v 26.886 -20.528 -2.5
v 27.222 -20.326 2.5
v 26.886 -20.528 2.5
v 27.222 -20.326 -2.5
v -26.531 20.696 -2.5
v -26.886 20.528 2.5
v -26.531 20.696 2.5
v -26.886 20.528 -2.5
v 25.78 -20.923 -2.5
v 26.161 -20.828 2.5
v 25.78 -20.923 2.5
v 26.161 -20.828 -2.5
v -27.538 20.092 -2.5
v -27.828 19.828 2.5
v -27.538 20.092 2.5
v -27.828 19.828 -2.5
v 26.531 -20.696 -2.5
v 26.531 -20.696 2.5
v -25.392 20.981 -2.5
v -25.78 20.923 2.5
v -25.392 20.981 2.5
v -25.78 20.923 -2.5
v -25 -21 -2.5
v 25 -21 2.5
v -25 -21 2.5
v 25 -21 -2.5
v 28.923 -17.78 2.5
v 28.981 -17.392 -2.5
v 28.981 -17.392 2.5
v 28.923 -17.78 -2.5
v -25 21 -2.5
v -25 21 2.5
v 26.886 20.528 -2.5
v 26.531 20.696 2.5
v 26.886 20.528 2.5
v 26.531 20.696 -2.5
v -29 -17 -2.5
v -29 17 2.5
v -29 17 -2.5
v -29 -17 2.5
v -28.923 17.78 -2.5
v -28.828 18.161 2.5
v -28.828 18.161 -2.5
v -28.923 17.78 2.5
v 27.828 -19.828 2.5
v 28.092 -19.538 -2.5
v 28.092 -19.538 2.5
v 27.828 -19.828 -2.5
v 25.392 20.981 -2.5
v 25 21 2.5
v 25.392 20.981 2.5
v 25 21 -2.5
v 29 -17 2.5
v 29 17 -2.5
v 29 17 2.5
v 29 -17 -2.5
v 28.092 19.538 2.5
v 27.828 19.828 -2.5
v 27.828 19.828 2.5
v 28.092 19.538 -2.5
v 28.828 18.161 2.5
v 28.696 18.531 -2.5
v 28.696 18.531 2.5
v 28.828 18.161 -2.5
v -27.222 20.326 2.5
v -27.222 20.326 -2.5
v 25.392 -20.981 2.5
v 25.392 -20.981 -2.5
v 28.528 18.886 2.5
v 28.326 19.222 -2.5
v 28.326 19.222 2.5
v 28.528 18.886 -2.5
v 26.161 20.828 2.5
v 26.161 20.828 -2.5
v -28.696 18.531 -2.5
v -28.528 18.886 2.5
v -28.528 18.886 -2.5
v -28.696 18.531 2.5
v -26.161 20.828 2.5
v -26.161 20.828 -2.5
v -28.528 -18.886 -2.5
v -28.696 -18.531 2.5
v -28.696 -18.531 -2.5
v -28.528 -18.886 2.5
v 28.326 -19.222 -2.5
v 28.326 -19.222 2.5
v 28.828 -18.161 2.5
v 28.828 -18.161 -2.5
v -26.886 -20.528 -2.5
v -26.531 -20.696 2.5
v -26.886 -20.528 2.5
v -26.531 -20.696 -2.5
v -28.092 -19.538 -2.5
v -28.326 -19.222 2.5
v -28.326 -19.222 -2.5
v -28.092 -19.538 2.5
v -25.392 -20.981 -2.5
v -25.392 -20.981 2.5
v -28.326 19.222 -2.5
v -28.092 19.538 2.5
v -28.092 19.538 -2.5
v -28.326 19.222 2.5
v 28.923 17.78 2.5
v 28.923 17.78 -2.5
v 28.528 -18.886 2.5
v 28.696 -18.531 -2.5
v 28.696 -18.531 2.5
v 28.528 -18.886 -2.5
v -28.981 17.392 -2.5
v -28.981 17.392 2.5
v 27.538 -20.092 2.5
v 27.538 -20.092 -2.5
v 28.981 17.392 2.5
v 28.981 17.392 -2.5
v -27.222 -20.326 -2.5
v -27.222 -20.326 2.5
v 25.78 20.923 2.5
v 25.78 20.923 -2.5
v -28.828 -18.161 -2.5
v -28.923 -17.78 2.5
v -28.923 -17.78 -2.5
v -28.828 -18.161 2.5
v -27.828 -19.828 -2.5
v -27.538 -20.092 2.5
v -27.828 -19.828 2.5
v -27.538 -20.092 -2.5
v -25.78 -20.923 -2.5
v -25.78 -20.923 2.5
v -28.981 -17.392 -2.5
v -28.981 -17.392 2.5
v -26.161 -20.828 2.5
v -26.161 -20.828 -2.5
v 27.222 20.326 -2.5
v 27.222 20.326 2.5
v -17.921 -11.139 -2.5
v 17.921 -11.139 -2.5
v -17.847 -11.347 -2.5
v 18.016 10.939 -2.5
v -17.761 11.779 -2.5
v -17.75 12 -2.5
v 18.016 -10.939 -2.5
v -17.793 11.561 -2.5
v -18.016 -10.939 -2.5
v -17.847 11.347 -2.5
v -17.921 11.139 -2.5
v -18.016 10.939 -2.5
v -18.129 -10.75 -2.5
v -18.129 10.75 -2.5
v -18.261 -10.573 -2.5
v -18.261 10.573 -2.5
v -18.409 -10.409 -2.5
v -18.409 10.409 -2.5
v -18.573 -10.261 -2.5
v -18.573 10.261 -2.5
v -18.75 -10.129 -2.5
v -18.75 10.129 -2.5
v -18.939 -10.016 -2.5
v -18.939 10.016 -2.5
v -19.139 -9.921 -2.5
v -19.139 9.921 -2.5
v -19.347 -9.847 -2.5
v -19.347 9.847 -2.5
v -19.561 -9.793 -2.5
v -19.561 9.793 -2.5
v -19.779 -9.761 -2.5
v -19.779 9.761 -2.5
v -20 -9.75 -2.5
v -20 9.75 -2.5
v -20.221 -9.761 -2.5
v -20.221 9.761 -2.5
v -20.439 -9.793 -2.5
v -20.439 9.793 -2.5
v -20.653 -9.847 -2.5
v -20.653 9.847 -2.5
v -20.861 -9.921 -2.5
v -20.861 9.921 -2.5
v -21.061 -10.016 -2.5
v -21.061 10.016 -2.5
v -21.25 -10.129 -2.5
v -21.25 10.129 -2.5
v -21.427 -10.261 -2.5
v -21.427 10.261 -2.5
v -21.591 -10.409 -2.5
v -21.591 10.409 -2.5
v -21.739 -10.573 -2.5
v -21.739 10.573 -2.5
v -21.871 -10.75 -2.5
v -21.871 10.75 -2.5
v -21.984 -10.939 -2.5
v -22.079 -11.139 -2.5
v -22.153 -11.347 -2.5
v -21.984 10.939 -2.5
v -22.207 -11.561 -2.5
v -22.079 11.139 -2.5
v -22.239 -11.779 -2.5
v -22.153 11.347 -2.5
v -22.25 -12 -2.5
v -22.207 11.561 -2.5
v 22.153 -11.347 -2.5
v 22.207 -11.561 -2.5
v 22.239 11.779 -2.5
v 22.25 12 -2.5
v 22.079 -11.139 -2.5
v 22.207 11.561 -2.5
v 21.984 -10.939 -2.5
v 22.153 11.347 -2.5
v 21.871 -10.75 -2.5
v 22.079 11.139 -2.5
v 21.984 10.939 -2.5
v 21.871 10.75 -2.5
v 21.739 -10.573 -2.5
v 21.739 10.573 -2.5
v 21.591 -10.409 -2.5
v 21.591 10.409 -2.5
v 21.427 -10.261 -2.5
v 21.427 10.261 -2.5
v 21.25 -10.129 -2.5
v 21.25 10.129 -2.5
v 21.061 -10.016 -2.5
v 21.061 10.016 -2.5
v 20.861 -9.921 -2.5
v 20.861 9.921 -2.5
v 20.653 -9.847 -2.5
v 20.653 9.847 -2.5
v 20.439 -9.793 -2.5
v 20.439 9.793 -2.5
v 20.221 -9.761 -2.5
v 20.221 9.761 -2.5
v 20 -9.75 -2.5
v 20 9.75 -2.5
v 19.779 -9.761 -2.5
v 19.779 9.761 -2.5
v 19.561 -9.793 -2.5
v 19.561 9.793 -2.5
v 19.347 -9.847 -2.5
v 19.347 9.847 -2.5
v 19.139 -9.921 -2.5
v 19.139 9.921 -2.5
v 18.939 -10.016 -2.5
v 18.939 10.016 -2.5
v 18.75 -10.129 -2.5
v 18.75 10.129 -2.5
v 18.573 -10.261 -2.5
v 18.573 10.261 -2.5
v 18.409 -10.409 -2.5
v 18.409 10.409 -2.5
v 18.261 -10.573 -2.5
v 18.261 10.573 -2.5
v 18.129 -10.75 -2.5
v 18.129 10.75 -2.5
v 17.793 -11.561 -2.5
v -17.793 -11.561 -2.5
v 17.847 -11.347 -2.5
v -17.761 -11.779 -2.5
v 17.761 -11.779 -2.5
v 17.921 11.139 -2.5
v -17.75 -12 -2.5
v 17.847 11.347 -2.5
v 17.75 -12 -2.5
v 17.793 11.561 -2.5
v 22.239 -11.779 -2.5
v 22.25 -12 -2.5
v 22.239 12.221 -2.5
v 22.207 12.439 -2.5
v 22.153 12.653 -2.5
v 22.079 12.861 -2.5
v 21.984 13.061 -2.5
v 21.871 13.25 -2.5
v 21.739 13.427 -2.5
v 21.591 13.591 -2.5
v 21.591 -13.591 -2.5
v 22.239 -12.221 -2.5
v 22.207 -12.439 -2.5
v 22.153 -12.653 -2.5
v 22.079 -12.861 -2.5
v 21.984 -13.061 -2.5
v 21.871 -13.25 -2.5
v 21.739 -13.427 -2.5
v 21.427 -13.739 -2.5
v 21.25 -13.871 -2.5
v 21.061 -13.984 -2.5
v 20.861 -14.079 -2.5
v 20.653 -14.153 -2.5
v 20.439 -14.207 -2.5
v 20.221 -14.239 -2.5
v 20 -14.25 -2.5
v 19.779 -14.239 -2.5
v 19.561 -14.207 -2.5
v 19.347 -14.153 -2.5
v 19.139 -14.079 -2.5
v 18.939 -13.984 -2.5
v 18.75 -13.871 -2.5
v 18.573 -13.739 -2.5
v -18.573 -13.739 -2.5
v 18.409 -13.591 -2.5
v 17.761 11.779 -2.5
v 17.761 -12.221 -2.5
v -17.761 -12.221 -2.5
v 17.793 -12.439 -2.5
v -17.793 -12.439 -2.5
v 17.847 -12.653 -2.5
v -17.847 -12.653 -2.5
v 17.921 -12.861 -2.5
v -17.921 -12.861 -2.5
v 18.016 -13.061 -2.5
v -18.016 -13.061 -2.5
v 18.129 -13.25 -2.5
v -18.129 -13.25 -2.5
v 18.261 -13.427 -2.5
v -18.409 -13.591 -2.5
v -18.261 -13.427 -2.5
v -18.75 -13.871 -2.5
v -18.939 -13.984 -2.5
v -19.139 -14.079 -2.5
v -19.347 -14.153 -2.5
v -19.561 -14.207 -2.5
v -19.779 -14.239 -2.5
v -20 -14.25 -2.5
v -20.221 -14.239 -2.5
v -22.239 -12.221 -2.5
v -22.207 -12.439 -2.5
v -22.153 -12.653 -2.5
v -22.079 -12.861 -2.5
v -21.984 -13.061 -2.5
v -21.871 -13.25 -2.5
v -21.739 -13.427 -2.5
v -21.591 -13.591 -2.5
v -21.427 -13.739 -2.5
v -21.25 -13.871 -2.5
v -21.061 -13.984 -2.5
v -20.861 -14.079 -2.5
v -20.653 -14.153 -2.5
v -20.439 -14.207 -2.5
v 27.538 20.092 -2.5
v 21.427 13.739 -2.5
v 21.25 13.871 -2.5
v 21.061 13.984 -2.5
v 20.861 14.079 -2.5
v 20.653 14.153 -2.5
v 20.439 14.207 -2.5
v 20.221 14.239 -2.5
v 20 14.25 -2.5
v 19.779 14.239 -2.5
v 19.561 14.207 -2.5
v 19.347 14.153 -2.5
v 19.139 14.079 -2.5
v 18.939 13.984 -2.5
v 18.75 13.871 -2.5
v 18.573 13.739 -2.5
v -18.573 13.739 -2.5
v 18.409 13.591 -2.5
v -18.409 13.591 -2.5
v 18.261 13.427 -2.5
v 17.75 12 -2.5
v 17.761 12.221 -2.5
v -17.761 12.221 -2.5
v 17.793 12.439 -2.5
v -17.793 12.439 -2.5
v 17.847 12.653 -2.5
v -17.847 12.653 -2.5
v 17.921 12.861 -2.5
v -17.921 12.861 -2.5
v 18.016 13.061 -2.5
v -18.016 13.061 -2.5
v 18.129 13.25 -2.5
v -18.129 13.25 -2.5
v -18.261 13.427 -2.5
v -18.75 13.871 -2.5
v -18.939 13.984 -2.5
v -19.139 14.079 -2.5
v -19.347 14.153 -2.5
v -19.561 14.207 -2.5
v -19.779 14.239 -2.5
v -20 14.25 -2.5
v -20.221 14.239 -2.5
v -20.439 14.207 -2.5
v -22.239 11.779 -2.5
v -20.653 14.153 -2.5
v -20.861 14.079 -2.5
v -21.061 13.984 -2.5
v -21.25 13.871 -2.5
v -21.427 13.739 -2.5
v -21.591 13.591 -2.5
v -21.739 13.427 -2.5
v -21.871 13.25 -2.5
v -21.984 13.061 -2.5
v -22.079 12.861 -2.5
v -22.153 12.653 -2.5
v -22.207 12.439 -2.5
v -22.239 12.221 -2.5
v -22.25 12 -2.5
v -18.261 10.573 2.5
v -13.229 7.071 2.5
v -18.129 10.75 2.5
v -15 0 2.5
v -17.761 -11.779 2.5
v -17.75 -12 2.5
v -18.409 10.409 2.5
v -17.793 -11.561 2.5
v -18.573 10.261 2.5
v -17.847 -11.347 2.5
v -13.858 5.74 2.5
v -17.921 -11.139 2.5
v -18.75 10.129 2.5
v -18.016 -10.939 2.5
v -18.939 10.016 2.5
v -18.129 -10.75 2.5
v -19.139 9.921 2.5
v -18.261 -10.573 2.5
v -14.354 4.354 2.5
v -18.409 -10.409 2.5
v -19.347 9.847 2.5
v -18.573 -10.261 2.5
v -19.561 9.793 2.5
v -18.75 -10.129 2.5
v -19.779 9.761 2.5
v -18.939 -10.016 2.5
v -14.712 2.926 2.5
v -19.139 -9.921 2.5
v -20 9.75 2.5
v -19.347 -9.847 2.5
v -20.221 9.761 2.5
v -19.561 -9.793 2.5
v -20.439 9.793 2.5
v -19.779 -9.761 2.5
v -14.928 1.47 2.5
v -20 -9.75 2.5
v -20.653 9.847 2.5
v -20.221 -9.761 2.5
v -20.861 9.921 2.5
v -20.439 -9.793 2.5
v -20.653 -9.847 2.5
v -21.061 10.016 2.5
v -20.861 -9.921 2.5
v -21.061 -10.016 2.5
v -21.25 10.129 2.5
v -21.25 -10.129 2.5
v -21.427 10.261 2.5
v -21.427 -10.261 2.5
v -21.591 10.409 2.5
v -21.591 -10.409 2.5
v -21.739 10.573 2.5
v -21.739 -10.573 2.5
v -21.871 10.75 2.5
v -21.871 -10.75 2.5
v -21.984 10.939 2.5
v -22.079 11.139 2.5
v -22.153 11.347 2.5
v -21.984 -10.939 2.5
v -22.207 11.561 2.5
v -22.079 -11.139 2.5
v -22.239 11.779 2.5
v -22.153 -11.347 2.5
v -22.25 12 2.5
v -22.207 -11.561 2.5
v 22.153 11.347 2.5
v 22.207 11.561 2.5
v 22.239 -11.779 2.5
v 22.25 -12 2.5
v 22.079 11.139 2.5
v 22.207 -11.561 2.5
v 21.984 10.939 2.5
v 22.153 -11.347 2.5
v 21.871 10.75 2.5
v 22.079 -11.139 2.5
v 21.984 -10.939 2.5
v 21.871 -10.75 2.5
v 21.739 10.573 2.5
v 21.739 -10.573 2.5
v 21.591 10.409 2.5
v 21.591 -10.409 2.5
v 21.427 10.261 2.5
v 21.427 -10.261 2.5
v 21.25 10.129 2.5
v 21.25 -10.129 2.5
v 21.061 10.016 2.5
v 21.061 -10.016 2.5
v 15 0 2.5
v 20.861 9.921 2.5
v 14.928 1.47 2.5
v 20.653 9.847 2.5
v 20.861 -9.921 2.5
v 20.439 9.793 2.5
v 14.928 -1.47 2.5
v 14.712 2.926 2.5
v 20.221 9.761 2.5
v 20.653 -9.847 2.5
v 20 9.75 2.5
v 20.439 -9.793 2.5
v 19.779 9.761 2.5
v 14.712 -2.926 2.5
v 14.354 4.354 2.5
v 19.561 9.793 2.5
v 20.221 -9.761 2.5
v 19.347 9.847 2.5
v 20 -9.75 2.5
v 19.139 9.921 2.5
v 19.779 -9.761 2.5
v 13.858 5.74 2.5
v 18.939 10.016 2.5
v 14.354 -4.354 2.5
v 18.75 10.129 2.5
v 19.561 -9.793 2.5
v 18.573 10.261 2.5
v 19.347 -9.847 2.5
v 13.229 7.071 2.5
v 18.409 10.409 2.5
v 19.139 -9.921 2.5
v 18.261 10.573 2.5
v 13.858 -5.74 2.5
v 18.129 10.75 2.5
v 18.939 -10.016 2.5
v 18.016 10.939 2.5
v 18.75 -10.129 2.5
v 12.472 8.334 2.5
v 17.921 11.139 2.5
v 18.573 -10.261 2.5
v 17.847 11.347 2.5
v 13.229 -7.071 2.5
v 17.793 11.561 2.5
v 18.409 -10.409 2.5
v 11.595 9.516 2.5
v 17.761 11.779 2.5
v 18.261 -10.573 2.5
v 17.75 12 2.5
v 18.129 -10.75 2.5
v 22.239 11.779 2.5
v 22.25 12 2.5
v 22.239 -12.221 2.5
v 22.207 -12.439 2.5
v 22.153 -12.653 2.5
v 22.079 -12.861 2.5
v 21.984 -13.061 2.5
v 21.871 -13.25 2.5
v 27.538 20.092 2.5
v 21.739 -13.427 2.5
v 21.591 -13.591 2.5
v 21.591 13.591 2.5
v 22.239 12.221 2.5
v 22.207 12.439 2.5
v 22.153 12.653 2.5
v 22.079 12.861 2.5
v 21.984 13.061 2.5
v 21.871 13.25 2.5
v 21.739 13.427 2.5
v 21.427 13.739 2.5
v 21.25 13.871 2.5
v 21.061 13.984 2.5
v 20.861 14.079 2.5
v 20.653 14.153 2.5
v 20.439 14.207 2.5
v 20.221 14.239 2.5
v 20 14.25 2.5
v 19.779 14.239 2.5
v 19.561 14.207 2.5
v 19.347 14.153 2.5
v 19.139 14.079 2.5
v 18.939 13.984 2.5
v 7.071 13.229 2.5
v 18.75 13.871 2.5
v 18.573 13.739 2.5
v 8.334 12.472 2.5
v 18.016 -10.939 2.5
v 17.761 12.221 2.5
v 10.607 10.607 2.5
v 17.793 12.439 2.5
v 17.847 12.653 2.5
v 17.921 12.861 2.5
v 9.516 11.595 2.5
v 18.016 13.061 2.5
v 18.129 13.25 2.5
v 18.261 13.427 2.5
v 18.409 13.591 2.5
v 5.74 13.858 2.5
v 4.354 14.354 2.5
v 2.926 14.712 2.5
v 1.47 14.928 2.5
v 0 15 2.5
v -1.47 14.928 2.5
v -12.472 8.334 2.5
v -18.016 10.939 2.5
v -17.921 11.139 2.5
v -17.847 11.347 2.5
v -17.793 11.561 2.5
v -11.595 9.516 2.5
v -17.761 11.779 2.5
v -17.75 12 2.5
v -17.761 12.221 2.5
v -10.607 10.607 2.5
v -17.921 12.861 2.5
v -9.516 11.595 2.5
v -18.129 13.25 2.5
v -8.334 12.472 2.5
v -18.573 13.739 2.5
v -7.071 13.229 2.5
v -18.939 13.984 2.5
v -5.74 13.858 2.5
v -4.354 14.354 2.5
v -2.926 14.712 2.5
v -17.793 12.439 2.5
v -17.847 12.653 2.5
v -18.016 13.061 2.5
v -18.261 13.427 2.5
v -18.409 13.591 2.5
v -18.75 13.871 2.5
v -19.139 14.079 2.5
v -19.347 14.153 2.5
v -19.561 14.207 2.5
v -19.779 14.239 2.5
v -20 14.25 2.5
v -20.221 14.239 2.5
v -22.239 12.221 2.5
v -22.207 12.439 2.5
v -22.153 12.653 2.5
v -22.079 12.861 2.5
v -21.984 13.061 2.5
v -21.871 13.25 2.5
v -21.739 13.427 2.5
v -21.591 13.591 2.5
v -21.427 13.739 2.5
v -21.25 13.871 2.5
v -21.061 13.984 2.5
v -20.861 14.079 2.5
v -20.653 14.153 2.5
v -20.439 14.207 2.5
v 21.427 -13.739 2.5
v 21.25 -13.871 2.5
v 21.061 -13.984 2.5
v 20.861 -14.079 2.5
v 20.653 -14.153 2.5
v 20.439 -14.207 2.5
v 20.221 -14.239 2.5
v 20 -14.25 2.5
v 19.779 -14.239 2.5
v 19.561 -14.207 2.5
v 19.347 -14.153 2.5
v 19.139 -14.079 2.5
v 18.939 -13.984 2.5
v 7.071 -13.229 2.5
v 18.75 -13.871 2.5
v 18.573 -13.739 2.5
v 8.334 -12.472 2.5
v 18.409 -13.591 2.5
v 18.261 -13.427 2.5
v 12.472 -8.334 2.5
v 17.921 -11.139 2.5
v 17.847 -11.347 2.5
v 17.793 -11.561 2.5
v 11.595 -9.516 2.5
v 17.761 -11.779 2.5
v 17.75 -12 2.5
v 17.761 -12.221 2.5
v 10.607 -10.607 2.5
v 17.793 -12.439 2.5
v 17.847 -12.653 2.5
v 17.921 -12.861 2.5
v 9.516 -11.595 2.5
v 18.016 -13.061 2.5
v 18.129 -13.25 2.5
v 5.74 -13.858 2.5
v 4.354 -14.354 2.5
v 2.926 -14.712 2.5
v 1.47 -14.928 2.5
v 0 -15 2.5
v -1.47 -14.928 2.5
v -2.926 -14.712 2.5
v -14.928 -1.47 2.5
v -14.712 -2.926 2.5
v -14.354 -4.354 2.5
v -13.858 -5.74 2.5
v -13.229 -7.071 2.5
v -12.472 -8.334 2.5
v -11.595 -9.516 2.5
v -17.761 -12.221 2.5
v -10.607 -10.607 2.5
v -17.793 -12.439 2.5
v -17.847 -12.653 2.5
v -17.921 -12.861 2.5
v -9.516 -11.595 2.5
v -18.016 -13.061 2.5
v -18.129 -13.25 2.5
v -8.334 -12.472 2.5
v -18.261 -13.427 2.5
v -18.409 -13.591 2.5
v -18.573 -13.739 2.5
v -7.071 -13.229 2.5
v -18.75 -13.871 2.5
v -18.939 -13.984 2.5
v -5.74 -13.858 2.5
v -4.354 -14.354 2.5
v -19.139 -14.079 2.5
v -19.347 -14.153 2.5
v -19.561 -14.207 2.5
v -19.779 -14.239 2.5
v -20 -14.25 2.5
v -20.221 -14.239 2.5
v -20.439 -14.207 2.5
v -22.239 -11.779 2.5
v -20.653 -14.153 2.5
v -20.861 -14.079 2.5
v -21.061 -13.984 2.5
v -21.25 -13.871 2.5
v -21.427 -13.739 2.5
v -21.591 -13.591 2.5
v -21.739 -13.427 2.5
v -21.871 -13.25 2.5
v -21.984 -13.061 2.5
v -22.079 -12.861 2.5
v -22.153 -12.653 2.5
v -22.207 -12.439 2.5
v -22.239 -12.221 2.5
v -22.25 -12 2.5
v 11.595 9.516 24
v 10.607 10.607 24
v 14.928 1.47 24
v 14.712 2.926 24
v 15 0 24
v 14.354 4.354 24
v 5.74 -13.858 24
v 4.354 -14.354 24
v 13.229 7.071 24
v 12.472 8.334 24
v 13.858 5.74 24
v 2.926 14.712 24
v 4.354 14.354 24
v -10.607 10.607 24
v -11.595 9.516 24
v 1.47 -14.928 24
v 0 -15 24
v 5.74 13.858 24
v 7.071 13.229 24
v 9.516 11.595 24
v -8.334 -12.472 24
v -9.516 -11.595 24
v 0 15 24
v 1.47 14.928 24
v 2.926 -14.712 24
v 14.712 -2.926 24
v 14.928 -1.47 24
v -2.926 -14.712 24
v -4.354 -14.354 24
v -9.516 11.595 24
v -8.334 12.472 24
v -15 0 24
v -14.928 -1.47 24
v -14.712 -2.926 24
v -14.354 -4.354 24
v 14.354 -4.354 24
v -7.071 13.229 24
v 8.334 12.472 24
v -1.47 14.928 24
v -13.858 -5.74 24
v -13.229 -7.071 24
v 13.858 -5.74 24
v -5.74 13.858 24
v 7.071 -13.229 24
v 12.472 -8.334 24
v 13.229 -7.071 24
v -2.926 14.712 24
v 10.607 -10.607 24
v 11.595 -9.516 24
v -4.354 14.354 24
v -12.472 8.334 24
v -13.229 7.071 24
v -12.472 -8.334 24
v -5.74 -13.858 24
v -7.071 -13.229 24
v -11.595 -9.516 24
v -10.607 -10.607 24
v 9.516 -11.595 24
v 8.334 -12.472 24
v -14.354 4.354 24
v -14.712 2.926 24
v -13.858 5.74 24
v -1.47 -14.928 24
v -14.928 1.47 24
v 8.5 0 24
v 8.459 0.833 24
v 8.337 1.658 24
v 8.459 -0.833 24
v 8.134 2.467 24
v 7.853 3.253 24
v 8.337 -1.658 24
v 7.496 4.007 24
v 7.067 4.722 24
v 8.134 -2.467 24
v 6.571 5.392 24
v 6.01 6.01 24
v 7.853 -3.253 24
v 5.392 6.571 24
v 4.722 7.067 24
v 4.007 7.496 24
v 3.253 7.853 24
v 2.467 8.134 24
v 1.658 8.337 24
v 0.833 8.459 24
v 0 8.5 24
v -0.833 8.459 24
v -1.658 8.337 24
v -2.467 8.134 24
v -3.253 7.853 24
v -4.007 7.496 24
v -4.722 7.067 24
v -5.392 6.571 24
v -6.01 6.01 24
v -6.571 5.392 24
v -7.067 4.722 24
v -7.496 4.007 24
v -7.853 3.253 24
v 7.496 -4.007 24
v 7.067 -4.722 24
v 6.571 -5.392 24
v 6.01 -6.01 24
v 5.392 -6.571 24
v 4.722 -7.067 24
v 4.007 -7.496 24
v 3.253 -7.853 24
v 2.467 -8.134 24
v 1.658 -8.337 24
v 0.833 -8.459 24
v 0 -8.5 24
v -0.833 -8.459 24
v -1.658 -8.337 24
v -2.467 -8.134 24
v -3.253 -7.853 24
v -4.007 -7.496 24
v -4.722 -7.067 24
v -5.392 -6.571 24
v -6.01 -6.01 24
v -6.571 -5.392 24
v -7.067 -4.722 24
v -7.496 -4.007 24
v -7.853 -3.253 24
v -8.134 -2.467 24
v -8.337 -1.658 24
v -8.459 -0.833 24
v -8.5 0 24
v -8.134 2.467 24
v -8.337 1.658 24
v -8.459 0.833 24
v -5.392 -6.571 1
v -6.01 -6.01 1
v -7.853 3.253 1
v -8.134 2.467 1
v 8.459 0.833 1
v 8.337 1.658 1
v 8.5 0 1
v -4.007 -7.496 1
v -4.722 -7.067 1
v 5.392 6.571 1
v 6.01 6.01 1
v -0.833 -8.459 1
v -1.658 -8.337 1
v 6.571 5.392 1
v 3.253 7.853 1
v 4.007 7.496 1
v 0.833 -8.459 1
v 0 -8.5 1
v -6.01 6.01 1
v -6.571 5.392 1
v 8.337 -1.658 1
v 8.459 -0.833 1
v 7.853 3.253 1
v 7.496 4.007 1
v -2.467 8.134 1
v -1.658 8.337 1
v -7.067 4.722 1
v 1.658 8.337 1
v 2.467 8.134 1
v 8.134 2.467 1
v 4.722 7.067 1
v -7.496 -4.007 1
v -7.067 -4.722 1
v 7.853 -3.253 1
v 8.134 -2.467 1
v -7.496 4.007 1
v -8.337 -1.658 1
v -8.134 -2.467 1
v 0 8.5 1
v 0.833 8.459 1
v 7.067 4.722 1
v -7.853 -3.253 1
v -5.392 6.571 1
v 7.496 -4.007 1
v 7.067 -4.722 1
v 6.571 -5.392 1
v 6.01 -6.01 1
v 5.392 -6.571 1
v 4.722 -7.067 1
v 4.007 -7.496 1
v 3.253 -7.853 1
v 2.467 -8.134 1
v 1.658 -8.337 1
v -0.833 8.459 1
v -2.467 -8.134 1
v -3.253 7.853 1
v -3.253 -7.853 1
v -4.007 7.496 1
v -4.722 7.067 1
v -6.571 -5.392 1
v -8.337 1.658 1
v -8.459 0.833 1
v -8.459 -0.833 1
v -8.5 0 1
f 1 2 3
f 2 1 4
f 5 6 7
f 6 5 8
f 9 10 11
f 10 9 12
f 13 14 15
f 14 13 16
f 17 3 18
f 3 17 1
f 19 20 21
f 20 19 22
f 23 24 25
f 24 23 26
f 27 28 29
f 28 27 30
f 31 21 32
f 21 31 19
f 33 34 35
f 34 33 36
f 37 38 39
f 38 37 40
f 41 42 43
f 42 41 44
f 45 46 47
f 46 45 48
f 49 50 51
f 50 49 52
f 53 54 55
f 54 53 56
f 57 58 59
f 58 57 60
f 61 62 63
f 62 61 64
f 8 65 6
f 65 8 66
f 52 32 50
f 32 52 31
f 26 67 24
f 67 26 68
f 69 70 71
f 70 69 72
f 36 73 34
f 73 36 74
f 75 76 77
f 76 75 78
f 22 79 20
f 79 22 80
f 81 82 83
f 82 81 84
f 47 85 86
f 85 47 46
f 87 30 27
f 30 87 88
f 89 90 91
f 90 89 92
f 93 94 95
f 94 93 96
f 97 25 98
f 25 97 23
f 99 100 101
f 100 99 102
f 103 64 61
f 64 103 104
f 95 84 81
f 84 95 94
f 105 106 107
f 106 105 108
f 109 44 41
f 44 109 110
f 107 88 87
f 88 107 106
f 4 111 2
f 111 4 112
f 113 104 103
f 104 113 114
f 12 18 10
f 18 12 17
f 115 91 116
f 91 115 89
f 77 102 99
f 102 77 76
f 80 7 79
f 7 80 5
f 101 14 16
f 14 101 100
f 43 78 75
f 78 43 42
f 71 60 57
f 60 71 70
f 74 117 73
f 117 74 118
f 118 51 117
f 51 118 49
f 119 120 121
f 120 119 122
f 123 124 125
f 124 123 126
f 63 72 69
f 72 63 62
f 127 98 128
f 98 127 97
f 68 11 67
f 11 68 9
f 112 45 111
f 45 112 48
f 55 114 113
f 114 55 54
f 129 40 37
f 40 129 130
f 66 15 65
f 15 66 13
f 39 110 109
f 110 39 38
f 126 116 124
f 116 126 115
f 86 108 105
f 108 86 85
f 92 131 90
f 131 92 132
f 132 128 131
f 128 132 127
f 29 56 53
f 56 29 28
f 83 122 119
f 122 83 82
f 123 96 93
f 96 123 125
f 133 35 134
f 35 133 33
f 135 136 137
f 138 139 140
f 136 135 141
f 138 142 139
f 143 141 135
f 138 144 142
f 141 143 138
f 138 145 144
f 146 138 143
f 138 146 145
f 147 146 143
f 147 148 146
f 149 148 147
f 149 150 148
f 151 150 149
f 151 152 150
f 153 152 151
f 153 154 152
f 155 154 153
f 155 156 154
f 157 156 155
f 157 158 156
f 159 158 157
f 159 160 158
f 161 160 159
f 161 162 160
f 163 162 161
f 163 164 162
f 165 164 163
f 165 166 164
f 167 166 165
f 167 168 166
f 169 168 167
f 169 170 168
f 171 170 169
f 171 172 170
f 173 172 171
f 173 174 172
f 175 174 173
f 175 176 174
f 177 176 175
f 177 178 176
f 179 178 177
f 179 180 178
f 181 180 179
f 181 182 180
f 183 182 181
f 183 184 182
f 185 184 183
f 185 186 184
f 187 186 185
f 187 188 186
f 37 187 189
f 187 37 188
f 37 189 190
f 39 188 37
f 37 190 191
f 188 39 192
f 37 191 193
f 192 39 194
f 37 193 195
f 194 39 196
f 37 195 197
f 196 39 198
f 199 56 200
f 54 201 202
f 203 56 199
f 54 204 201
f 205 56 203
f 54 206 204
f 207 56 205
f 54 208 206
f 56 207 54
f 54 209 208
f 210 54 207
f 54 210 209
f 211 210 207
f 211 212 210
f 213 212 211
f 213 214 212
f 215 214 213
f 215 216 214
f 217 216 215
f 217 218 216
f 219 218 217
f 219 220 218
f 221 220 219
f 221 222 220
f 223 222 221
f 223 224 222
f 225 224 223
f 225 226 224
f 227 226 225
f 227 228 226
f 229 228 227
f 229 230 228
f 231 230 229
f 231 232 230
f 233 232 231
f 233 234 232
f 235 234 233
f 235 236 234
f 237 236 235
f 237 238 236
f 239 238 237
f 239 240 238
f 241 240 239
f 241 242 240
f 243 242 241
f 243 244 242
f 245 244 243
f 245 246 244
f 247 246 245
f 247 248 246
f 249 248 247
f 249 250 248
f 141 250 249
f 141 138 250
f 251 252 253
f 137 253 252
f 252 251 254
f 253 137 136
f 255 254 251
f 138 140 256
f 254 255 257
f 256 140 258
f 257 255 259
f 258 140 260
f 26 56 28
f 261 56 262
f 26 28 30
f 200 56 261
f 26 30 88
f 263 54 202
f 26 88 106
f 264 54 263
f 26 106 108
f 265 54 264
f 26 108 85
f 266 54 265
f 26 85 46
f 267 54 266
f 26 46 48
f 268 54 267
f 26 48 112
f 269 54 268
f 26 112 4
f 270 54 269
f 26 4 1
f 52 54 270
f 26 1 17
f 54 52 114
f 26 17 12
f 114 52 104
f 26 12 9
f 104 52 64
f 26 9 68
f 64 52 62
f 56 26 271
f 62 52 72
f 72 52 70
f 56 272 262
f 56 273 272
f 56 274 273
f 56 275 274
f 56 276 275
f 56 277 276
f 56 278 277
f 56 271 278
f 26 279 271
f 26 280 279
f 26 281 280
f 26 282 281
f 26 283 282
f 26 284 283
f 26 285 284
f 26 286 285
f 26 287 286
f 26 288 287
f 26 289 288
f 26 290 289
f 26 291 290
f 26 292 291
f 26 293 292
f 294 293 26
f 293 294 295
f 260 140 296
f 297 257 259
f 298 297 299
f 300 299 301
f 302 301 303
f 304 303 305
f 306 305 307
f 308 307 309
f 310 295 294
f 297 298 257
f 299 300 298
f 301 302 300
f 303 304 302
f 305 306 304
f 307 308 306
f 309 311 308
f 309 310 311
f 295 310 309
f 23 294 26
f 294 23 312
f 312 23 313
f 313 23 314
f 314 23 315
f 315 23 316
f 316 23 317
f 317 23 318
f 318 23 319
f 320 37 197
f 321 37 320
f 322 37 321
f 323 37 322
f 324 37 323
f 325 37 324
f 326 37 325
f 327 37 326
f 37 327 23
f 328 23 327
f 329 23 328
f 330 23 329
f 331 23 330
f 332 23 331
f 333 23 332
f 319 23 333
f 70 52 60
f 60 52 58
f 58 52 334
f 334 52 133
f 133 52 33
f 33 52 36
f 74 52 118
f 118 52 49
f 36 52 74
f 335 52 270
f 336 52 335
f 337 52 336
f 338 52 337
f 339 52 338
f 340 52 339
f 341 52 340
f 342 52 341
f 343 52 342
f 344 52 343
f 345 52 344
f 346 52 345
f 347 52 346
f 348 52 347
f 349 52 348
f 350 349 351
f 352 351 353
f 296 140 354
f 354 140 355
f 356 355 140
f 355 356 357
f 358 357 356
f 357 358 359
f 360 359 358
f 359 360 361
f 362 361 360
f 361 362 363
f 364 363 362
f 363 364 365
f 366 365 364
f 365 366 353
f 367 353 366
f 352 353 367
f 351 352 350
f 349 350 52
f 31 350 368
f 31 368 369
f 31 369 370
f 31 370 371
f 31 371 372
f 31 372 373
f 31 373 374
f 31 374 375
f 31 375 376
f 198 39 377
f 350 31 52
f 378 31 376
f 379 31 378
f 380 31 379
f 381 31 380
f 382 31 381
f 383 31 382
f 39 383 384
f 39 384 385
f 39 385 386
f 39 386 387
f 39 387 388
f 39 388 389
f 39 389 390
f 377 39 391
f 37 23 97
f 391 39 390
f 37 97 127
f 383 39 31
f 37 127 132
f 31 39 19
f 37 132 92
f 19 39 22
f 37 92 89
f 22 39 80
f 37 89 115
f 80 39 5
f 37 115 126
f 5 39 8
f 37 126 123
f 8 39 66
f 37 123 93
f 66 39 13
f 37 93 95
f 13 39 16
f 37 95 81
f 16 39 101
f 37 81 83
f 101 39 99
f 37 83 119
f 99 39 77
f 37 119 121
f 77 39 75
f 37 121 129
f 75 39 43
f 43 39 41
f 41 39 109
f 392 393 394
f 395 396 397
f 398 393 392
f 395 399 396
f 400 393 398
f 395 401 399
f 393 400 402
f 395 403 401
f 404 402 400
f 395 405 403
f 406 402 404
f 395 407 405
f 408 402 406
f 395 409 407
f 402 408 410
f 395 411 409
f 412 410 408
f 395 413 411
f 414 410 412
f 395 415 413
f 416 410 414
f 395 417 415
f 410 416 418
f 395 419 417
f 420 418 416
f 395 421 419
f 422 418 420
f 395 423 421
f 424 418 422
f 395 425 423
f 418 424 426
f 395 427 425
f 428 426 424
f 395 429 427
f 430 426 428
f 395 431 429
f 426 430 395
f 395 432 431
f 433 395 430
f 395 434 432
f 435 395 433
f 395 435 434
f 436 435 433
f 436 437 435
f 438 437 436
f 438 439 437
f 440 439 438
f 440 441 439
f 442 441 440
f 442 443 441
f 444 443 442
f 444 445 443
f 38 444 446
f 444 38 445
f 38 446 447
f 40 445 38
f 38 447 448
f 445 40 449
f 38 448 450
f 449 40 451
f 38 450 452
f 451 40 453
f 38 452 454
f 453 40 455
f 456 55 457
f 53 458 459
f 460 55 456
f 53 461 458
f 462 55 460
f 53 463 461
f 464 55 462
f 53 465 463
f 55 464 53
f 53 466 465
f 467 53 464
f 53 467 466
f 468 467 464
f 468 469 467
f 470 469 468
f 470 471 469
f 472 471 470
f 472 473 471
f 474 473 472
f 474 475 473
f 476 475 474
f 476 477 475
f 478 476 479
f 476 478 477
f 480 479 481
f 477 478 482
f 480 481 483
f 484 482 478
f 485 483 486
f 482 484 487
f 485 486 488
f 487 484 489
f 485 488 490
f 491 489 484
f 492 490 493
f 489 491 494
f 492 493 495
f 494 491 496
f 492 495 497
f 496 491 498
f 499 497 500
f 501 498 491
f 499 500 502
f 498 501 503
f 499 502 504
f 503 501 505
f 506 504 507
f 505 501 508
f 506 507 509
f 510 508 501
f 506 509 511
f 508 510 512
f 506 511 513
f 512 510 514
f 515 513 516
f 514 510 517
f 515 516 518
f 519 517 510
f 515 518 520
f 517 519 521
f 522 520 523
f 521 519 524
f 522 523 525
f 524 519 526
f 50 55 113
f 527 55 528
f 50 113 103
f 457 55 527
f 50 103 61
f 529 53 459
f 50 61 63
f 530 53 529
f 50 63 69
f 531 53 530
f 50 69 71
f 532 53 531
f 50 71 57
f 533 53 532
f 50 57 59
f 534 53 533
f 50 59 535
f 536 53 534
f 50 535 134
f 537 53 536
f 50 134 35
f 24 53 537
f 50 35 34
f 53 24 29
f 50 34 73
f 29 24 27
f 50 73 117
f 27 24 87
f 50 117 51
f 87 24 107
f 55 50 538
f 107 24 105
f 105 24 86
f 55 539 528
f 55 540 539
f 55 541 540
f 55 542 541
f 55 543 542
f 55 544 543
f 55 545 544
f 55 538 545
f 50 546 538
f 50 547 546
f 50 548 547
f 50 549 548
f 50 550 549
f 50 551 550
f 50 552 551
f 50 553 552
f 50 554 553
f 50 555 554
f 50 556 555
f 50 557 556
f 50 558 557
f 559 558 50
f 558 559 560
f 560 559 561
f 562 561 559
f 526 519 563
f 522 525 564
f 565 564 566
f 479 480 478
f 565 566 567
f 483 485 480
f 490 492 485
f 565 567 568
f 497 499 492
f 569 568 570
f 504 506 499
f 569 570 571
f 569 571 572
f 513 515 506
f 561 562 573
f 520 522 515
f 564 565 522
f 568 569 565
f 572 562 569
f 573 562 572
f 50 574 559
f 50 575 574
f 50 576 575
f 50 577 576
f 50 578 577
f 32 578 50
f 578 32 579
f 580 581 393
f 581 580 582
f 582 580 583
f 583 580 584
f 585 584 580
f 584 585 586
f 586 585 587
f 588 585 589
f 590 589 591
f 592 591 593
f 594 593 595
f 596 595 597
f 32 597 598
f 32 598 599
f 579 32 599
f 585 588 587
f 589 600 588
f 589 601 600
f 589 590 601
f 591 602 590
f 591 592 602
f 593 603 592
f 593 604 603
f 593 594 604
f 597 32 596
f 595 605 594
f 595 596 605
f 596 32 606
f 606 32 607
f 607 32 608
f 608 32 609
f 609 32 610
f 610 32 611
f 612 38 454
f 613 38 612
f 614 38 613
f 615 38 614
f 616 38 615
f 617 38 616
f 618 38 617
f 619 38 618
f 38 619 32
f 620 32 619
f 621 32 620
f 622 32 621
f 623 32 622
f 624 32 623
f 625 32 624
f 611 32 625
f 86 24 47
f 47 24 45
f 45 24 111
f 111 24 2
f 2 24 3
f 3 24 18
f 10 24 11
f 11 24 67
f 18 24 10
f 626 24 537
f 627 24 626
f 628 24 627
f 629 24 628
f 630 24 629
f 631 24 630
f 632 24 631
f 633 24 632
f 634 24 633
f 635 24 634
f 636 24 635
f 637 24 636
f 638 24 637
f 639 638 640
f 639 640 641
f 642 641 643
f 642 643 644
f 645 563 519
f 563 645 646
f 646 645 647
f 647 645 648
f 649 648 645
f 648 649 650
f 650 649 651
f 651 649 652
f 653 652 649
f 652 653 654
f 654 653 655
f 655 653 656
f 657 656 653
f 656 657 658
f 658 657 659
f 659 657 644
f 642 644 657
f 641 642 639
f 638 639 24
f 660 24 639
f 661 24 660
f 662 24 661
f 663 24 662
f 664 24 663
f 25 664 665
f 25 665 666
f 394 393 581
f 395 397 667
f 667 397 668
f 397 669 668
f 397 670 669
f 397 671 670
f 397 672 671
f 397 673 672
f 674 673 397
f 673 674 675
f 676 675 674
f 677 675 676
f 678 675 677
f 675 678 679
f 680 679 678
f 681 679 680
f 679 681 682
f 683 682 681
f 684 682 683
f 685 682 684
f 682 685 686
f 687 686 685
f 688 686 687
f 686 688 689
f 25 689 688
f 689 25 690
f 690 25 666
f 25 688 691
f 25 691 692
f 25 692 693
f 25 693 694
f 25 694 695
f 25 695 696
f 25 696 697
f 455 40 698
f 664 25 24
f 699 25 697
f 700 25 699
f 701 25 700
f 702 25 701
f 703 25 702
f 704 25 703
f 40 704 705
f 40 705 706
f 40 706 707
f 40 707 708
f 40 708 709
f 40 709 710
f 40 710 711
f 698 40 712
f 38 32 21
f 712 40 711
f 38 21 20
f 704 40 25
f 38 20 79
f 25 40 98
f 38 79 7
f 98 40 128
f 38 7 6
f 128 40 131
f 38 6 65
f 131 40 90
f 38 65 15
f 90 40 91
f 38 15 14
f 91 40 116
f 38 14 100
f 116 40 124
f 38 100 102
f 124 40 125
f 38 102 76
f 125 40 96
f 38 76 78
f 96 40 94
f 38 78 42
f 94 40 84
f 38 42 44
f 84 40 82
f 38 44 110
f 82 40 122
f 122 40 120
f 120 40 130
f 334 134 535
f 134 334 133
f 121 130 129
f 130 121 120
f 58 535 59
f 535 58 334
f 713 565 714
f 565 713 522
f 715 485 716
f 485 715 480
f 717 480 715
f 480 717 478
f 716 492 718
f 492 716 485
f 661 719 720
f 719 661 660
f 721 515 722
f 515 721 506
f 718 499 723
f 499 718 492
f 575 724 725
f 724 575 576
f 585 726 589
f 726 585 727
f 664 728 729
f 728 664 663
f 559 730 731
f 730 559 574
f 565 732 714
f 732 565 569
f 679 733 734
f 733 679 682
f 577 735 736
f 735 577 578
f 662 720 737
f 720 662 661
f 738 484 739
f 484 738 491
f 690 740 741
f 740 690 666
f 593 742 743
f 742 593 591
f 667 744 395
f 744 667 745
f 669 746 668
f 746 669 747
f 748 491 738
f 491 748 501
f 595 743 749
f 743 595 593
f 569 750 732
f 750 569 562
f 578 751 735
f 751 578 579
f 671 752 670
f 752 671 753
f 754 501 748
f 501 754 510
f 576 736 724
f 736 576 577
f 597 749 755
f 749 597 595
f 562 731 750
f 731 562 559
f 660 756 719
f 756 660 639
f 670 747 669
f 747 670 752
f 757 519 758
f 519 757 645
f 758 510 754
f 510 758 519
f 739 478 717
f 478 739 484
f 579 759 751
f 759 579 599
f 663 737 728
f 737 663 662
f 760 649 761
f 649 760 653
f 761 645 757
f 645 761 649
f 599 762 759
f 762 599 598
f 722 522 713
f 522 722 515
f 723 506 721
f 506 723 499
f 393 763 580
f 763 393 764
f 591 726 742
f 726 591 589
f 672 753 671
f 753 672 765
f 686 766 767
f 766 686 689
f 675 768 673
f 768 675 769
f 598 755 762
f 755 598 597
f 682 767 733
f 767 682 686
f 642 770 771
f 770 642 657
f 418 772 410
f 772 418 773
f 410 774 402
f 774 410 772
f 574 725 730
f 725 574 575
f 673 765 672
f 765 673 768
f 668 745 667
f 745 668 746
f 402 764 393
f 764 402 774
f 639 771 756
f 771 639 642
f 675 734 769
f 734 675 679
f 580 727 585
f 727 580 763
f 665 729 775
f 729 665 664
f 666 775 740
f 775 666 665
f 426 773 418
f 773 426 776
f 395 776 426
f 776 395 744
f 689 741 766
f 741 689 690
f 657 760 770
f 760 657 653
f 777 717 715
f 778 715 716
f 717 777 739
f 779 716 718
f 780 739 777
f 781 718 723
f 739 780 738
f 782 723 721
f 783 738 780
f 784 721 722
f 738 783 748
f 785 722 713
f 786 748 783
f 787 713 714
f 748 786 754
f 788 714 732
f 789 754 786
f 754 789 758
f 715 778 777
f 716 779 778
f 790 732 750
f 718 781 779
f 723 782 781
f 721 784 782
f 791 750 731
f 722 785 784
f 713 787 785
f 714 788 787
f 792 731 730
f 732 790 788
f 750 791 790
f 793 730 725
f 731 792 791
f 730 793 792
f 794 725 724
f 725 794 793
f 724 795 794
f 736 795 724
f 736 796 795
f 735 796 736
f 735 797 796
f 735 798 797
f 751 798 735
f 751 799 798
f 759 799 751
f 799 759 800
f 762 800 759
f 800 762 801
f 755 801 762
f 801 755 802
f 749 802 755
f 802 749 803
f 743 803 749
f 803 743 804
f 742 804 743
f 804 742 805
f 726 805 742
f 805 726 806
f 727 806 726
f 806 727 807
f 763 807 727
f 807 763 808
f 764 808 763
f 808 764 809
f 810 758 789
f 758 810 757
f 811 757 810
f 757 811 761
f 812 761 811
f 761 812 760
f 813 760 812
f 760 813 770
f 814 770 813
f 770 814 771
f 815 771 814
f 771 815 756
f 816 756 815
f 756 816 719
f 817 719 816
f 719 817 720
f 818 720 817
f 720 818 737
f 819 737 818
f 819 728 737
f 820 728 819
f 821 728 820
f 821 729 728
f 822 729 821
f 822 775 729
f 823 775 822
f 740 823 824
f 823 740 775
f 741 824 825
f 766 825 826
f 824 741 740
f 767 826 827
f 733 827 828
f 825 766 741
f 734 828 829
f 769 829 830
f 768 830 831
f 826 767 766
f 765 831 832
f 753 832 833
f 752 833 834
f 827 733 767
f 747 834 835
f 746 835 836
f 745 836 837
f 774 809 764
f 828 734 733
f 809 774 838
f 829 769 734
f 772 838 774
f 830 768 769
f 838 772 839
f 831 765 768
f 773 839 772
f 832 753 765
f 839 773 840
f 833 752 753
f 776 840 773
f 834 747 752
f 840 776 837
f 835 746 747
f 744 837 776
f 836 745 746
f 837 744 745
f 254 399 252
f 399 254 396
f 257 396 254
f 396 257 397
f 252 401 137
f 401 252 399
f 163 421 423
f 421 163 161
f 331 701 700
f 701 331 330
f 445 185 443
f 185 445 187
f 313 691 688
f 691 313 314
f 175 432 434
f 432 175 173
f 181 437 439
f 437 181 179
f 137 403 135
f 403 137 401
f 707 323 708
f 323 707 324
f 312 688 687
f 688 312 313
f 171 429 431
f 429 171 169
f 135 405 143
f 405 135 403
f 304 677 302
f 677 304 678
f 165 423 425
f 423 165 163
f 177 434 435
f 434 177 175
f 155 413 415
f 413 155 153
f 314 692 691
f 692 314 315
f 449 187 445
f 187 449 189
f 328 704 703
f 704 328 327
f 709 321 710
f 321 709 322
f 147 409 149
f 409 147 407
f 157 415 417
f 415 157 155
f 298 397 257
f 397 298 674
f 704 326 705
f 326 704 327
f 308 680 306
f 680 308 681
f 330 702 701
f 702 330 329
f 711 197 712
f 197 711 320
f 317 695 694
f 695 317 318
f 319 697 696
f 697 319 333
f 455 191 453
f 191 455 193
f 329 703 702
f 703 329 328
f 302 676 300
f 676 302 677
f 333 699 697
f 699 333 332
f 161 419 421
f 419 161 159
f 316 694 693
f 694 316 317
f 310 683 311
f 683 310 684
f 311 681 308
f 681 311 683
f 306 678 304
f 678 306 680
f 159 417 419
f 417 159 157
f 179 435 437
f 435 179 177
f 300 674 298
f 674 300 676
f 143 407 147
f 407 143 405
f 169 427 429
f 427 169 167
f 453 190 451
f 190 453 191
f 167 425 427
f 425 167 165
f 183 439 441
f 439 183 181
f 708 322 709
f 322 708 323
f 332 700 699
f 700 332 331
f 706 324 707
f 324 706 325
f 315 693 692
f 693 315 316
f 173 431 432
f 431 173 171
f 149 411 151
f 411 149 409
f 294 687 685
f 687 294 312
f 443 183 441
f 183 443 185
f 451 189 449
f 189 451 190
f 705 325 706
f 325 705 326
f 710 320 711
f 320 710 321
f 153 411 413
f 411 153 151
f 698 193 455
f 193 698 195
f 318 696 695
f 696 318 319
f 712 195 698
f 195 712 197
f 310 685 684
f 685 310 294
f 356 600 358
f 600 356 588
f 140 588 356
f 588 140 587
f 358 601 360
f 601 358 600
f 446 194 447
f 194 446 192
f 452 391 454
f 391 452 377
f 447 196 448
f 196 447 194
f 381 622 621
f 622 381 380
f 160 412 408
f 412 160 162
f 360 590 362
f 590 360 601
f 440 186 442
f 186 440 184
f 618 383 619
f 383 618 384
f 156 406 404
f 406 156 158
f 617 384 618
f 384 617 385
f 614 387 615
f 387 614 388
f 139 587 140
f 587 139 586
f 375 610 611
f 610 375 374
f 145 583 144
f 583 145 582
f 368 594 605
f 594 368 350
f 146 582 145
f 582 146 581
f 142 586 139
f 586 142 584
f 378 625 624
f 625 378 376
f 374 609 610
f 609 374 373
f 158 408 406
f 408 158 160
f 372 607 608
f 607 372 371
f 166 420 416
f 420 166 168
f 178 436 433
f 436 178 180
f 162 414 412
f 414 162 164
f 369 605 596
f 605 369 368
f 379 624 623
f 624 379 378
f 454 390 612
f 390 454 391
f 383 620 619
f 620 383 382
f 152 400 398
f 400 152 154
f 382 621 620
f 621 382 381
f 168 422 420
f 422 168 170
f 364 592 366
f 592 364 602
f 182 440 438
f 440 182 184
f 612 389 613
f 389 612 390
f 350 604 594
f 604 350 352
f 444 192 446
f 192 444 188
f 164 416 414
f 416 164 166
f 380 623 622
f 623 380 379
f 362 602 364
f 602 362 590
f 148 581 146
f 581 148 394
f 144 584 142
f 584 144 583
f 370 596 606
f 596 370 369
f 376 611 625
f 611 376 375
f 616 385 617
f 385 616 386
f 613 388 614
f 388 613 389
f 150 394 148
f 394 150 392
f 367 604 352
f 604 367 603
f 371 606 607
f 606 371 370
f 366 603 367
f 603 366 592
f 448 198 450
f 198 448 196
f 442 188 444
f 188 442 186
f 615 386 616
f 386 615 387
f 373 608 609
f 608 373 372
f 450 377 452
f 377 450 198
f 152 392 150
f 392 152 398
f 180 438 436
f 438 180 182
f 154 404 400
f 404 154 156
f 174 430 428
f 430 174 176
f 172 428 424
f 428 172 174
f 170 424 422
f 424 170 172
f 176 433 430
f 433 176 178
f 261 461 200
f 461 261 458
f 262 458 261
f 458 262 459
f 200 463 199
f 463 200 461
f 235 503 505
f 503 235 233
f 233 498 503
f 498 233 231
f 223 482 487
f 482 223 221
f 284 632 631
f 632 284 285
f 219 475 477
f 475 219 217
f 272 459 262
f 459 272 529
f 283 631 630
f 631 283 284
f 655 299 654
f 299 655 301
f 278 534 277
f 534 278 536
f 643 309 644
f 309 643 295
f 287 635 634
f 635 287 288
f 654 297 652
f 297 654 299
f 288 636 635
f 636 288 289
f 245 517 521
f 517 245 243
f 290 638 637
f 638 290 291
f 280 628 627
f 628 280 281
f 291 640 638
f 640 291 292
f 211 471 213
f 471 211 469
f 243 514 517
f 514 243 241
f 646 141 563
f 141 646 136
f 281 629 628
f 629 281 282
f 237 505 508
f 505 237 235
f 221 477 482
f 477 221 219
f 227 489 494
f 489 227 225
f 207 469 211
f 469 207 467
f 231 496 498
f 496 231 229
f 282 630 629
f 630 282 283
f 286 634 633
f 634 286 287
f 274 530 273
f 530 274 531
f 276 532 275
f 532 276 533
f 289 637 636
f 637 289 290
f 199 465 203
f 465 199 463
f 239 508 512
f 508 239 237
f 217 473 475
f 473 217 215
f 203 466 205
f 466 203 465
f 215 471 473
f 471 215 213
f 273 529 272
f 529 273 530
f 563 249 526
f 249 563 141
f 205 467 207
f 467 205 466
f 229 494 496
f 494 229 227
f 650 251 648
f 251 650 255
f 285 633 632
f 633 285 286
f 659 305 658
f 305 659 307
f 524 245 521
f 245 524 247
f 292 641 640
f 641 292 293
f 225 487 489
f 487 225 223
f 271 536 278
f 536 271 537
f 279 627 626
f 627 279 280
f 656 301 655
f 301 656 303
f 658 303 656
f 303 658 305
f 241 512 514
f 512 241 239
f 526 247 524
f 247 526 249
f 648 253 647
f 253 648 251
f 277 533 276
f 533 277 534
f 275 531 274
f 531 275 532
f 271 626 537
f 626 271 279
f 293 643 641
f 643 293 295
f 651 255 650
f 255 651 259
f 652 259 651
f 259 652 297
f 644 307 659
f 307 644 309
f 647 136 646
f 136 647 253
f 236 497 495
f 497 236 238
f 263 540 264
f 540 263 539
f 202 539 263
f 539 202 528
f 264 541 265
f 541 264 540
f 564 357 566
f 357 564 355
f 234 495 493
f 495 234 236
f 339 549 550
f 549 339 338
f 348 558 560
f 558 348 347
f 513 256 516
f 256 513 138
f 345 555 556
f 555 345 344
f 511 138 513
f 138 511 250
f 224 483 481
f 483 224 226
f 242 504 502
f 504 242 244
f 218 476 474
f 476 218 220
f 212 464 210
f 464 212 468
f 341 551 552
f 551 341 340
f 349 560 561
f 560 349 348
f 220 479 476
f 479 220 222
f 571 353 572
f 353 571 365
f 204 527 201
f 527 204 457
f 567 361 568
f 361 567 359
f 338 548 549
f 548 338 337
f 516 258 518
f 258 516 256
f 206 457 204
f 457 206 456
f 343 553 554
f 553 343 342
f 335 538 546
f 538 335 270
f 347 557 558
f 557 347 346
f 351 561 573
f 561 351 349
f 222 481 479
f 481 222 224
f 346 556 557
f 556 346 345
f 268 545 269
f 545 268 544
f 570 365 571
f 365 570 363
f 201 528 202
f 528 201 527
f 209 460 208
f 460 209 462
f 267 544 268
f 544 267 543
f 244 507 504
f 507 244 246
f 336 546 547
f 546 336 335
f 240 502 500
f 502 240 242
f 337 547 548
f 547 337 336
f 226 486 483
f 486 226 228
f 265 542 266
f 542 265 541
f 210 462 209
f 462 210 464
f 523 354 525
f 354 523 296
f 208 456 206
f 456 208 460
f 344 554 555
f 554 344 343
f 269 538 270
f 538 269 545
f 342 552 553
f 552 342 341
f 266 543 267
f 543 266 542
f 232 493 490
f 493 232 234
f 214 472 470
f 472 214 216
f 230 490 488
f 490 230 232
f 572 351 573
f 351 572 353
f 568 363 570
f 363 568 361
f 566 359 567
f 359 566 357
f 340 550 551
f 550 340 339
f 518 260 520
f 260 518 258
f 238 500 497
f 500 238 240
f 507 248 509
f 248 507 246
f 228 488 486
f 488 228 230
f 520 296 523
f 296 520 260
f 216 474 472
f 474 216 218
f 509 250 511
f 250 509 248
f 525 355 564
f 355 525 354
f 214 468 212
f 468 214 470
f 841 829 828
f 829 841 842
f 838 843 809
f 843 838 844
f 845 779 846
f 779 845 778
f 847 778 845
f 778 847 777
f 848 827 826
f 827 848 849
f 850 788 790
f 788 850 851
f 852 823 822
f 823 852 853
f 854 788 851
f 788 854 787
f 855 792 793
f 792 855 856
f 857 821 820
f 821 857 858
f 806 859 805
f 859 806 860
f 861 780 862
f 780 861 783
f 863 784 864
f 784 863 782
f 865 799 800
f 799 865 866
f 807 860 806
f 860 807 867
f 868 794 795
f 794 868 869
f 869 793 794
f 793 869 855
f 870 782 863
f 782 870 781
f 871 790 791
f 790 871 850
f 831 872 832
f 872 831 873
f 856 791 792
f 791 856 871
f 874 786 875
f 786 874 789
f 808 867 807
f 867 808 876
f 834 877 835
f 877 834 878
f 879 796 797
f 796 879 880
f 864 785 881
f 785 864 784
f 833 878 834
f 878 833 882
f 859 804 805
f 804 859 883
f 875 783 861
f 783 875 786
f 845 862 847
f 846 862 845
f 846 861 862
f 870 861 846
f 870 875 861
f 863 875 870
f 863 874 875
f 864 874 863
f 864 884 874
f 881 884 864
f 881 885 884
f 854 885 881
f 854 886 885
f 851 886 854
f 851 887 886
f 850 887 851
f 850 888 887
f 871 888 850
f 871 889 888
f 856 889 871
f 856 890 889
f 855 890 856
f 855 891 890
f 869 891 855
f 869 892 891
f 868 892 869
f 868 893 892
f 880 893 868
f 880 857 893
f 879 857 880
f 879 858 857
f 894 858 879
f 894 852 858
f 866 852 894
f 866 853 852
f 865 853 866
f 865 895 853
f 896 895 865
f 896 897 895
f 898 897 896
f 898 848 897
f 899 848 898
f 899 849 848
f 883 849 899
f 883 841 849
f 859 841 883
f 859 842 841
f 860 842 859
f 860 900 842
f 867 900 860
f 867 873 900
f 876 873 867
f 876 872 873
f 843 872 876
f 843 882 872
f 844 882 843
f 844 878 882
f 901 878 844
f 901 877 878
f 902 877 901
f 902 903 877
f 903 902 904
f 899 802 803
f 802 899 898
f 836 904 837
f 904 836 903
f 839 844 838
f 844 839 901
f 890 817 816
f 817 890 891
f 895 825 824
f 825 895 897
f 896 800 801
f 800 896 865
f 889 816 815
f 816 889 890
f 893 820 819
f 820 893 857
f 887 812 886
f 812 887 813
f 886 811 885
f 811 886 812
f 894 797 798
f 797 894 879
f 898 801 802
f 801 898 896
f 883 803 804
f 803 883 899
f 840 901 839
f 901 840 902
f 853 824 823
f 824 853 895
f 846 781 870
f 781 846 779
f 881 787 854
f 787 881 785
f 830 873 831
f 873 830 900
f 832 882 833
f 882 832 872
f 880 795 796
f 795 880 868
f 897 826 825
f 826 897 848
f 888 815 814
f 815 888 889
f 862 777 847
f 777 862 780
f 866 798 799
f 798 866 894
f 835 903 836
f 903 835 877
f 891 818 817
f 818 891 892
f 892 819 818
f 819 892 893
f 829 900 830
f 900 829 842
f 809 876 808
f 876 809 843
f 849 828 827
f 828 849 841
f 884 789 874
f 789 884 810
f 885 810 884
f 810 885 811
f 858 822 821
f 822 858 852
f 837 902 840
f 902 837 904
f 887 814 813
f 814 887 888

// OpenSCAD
// Exemplo SCAD de suporte para sensor
$fn = 64;
base_l = 58;
base_w = 42;
base_h = 5;

module rounded_plate(l, w, h, r) {
  hull() {
    for (x = [-l/2 + r, l/2 - r])
      for (y = [-w/2 + r, w/2 - r])
        translate([x, y, 0]) cylinder(h = h, r = r, center = true);
  }
}

difference() {
  union() {
    rounded_plate(base_l, base_w, base_h, 4);
    translate([0, 0, 13]) cylinder(h = 22, d = 30, center = true);
  }
  translate([0, 0, 13]) cylinder(h = 24, d = 17, center = true);
  for (x = [-20, 20])
    for (y = [-12, 12])
      translate([x, y, 0]) cylinder(h = 10, d = 4.5, center = true);
}
